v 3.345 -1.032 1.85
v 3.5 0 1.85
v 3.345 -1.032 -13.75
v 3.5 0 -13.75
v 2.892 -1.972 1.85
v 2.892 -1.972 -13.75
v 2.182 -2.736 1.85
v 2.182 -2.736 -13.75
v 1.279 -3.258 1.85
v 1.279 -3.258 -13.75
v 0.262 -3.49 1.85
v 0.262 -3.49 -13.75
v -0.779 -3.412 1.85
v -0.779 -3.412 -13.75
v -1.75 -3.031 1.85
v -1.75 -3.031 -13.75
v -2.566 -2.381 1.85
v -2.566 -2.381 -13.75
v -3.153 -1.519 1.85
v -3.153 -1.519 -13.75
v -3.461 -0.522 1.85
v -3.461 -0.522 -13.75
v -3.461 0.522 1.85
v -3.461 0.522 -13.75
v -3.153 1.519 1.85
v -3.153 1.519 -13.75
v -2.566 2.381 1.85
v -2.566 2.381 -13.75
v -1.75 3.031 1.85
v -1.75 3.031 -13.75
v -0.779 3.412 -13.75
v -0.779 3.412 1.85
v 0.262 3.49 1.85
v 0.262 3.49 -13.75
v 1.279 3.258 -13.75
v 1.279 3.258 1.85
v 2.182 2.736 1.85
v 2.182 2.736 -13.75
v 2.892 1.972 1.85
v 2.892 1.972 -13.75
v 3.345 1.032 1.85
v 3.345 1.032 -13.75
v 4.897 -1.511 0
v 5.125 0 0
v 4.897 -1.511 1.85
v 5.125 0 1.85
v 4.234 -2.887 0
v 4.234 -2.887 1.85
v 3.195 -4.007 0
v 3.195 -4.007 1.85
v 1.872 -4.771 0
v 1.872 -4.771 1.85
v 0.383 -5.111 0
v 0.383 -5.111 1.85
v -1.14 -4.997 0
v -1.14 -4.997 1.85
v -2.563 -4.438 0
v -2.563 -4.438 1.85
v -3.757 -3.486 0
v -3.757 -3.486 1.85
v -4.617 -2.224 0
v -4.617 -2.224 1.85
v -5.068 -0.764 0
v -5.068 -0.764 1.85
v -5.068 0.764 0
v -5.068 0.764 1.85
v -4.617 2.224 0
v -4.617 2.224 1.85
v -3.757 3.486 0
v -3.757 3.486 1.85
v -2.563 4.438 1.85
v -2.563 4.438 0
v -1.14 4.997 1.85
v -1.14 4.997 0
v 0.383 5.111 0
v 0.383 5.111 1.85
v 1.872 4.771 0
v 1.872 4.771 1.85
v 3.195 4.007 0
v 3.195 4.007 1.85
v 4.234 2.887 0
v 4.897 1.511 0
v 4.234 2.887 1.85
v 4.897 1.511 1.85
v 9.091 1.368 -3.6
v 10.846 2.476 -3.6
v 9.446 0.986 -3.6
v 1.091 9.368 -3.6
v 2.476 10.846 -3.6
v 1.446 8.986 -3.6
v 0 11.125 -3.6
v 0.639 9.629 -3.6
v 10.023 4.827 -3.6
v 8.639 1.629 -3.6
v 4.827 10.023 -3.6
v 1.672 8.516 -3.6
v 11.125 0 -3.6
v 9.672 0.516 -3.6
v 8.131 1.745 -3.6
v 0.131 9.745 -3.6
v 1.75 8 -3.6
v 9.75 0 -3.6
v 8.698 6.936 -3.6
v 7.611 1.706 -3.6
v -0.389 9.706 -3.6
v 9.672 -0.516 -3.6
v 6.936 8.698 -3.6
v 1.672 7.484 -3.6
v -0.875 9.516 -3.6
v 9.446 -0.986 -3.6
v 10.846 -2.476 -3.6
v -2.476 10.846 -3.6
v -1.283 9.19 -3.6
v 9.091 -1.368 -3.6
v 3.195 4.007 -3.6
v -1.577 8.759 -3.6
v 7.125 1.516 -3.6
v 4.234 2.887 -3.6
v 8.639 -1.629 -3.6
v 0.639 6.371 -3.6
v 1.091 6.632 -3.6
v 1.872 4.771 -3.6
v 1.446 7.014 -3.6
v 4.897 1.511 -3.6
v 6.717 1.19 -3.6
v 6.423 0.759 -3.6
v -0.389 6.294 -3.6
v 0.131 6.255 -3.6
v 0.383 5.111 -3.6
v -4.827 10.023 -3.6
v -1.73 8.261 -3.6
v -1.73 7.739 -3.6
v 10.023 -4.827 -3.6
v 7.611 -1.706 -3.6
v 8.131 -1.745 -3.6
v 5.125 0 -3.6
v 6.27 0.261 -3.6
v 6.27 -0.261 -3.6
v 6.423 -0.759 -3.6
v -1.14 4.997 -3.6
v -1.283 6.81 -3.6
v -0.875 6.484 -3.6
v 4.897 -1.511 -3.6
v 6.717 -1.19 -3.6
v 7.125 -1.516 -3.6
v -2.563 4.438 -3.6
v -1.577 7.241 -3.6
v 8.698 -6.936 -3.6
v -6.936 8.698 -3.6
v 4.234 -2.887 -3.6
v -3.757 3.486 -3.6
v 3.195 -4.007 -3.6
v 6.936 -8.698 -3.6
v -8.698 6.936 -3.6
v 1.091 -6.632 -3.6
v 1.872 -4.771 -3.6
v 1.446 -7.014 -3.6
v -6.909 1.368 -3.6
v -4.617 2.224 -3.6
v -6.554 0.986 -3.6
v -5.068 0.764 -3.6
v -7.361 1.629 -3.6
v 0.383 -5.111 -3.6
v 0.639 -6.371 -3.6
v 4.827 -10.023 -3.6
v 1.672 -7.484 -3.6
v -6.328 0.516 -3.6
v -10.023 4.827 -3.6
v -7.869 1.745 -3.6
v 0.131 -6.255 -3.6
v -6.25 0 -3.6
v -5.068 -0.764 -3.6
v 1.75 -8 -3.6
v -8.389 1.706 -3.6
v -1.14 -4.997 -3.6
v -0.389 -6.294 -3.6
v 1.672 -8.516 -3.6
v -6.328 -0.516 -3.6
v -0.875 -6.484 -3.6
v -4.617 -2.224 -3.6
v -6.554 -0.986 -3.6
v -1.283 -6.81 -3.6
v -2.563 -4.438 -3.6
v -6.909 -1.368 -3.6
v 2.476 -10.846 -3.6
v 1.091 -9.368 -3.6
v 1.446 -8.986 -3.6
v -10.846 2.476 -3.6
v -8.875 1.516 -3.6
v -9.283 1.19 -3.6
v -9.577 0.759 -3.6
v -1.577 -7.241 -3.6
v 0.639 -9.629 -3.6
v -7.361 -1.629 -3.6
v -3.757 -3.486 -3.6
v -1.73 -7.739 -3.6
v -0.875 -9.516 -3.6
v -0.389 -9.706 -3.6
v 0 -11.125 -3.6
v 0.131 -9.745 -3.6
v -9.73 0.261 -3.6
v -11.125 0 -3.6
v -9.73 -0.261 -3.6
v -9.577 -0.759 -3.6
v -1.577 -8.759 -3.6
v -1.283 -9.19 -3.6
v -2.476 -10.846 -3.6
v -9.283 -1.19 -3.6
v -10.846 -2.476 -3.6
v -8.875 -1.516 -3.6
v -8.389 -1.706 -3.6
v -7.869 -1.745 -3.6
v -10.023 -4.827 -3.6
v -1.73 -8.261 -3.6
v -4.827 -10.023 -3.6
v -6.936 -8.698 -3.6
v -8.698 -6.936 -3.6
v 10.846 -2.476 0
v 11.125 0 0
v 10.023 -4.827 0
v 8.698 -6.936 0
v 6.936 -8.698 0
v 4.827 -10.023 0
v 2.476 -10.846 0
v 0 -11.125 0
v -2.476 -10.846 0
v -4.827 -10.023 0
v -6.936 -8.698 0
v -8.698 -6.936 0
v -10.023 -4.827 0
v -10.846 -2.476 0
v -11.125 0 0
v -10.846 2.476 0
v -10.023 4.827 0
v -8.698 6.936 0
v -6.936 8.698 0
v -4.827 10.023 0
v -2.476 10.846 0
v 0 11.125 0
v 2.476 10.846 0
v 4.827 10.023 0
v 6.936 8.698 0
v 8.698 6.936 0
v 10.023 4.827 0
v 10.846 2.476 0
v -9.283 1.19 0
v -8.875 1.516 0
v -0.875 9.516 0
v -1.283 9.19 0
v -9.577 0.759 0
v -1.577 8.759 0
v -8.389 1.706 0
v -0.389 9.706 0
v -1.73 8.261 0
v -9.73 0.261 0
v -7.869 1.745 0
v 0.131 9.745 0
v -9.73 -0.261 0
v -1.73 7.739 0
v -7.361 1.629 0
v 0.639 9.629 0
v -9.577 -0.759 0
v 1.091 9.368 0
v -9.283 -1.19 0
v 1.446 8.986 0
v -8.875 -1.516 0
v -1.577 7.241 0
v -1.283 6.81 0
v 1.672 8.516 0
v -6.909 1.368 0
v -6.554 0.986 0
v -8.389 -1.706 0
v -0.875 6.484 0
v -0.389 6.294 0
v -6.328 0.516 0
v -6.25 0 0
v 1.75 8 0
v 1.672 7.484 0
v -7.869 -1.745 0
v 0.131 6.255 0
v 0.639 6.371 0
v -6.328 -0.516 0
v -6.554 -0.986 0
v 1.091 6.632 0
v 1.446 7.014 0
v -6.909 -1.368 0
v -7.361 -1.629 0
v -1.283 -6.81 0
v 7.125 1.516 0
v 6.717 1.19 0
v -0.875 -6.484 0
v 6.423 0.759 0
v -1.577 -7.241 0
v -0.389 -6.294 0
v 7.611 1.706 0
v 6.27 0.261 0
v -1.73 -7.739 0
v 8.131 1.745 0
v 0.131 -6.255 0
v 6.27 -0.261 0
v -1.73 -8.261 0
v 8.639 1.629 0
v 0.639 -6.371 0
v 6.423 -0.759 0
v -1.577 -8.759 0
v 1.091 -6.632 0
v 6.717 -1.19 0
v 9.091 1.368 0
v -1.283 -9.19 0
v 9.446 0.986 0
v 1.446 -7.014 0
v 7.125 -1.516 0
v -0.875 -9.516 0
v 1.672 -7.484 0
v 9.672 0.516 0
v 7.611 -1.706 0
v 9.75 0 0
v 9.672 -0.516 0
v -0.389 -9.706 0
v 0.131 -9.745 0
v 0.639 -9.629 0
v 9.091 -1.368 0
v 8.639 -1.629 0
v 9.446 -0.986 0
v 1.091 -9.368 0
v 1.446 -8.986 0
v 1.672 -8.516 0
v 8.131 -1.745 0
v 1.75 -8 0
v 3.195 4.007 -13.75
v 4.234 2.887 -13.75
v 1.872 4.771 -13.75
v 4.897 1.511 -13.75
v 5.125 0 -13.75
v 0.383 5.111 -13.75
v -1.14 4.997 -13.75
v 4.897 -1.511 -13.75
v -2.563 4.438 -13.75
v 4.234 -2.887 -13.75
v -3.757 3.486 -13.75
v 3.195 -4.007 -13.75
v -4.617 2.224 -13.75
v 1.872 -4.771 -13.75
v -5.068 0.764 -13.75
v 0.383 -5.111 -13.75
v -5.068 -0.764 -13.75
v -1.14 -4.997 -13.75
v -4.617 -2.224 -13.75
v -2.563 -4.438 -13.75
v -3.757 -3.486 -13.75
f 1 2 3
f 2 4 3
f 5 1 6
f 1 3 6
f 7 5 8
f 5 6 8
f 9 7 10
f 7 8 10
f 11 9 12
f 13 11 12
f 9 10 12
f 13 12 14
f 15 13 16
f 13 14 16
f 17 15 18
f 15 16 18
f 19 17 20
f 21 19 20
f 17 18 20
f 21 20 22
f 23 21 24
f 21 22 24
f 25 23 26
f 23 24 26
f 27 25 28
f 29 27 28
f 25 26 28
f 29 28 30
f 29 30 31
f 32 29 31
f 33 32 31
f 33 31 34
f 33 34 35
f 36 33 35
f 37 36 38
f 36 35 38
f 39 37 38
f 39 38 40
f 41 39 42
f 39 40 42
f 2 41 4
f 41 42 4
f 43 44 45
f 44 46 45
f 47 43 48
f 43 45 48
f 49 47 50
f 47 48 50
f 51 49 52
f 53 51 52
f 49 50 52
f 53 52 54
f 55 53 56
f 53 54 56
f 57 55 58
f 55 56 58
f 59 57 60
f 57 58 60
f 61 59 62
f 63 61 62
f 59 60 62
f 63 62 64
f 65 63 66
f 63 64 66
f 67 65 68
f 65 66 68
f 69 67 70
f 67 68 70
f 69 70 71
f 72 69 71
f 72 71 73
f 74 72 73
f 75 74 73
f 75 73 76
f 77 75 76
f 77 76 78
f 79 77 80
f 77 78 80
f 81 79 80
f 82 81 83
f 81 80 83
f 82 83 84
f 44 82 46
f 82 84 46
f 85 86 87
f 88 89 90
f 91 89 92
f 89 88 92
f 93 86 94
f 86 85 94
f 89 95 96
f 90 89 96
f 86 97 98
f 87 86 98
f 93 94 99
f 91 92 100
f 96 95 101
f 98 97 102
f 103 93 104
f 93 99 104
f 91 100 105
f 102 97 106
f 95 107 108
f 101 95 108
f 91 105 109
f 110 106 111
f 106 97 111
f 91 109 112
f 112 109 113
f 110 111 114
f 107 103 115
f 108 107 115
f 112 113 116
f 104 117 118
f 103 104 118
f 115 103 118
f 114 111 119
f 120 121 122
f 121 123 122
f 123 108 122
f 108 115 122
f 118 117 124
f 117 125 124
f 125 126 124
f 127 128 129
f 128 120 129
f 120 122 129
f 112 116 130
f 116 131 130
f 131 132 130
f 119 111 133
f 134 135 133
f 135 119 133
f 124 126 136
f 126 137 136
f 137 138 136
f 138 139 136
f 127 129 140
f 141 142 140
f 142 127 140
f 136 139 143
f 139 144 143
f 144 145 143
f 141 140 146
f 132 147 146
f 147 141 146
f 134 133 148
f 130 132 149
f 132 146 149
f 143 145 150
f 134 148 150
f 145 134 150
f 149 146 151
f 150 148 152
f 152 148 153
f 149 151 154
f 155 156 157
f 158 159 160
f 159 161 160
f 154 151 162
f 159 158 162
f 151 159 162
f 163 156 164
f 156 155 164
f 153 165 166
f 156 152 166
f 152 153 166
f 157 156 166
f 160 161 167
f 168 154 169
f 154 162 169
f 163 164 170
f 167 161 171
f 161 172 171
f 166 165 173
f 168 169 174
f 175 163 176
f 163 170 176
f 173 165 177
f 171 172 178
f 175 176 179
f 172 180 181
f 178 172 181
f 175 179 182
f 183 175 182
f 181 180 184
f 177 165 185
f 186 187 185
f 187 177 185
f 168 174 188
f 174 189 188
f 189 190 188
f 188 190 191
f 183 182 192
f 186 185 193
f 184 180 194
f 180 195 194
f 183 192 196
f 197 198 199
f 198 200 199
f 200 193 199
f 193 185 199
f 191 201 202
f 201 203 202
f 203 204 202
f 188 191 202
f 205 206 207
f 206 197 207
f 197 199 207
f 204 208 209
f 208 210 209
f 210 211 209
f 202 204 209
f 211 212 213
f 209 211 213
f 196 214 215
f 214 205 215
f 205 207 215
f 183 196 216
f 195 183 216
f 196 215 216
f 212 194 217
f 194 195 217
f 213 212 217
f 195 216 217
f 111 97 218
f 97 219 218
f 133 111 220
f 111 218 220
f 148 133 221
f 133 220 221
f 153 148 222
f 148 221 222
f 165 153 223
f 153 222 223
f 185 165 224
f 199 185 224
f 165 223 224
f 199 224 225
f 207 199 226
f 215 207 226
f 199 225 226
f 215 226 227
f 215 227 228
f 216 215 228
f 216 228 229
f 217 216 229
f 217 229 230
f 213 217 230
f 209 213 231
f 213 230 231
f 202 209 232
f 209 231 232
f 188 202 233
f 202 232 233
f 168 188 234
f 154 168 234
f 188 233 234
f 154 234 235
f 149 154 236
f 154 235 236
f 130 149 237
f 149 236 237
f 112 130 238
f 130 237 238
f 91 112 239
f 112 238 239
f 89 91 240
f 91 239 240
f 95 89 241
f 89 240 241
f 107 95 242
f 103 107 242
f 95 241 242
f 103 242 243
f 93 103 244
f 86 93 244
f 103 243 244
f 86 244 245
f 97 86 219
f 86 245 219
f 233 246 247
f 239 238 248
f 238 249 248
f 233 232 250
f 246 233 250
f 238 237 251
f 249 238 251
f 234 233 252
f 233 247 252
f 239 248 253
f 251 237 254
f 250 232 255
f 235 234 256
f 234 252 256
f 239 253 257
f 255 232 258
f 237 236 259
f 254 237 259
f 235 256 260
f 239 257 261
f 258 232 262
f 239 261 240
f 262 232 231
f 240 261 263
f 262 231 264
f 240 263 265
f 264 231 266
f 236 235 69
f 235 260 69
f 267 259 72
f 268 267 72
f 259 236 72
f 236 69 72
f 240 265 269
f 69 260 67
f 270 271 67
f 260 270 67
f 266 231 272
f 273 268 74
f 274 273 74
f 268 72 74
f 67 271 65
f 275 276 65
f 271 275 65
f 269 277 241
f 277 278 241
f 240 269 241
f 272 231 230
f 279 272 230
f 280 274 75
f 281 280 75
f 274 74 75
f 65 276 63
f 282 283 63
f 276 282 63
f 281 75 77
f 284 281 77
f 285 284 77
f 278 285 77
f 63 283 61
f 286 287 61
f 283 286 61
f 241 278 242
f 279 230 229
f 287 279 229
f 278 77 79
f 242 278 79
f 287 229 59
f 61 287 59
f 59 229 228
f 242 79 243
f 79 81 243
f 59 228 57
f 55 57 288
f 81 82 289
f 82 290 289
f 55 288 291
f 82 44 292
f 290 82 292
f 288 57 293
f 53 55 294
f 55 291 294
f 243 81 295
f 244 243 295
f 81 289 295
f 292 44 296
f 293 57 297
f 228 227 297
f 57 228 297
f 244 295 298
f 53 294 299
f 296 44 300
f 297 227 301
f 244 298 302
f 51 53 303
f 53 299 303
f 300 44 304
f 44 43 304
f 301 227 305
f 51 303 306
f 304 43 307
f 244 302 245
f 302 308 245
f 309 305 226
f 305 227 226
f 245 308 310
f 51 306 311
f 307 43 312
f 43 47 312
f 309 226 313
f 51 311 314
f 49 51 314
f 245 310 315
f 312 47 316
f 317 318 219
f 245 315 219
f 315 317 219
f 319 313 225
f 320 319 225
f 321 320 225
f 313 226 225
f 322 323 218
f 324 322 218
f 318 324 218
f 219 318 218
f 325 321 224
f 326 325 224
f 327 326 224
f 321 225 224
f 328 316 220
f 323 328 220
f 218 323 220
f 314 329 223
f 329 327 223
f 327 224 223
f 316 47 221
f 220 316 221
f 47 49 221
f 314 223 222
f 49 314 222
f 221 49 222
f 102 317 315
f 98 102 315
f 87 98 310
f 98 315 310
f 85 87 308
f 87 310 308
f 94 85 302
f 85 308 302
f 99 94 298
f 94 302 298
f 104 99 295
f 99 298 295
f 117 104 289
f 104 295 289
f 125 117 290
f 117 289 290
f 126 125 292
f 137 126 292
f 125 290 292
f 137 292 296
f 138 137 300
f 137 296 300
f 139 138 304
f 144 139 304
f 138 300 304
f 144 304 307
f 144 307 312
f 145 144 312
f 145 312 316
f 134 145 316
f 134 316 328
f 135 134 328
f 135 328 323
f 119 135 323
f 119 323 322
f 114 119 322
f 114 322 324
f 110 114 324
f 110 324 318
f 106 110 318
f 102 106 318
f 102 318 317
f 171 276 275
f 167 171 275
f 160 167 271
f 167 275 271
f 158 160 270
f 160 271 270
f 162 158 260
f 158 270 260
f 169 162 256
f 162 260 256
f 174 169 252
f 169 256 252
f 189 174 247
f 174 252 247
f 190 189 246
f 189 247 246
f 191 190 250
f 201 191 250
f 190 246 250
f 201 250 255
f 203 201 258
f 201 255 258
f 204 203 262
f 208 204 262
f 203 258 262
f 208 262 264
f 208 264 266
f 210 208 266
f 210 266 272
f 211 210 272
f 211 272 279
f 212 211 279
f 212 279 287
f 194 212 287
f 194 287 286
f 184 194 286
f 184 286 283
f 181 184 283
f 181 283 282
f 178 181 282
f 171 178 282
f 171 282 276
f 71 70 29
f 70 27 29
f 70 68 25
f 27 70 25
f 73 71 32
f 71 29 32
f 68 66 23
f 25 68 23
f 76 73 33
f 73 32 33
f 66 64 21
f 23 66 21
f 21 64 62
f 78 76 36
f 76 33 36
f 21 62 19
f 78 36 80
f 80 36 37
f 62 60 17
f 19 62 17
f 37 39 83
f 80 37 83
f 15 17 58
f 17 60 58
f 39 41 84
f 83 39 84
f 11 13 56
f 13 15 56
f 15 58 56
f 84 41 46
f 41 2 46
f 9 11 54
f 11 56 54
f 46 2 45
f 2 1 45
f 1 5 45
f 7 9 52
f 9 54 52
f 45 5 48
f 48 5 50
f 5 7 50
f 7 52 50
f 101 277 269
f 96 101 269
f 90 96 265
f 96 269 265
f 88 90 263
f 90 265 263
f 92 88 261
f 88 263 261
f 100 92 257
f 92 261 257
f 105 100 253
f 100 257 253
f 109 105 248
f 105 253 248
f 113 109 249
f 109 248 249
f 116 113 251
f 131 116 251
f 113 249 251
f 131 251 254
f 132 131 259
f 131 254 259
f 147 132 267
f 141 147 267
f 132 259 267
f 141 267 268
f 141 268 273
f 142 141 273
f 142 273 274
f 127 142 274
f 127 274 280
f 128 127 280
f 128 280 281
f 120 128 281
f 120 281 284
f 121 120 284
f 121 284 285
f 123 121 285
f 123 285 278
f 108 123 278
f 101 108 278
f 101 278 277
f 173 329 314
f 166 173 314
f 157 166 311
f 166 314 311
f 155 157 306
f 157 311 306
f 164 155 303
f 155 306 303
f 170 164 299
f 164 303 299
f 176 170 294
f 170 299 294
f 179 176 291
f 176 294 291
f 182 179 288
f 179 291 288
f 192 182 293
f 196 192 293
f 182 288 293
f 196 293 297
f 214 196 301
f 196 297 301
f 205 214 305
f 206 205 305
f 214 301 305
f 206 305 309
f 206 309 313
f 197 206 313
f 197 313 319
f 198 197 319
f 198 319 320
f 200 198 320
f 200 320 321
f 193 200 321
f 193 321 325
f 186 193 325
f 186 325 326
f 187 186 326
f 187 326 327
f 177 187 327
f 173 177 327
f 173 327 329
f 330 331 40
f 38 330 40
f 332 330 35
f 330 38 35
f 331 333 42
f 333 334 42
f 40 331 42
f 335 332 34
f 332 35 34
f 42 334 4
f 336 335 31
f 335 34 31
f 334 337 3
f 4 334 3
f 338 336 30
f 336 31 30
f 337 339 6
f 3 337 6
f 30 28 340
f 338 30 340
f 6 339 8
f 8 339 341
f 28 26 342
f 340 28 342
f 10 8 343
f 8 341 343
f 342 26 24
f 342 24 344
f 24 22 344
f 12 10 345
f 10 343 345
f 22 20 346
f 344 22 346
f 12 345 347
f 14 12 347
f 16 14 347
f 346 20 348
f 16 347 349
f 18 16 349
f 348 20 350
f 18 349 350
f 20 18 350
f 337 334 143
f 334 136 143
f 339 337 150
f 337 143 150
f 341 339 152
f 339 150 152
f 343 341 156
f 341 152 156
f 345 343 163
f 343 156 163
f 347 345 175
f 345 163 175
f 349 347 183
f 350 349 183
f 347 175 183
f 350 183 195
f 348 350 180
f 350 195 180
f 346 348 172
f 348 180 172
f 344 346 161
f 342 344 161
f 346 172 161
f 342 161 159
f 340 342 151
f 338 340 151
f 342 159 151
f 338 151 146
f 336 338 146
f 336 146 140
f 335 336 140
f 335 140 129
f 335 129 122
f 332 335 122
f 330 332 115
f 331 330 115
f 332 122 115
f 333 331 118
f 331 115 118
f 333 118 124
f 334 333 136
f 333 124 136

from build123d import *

# Parameters (mm, degrees)
F2_R     = 1.75
F3_DEPTH = 25


with BuildPart() as f1:
    # F0 (on Front) → F1 (revolve)
    with BuildSketch(Plane.XZ):
        Polygon((5.125, 1.85), (3.5, 1.85), (3.5, -13.75), (5.125, -13.75), (5.125, -3.6), (11.125, -3.6), (11.125, 0), (5.125, 0), align=None)
    revolve(axis=Axis((0, 0, -12.131187), (0, 0, -1)))

    # F2 (on face) → F3 (cut)
    with BuildSketch(Plane.XY):
        with Locations((0, 8)):
            Circle(F2_R)
        with Locations((-8, 0)):
            Circle(F2_R)
        with Locations((0, -8)):
            Circle(F2_R)
        with Locations((8, 0)):
            Circle(F2_R)
    extrude(amount=-F3_DEPTH, mode=Mode.SUBTRACT)


solid = f1.part
